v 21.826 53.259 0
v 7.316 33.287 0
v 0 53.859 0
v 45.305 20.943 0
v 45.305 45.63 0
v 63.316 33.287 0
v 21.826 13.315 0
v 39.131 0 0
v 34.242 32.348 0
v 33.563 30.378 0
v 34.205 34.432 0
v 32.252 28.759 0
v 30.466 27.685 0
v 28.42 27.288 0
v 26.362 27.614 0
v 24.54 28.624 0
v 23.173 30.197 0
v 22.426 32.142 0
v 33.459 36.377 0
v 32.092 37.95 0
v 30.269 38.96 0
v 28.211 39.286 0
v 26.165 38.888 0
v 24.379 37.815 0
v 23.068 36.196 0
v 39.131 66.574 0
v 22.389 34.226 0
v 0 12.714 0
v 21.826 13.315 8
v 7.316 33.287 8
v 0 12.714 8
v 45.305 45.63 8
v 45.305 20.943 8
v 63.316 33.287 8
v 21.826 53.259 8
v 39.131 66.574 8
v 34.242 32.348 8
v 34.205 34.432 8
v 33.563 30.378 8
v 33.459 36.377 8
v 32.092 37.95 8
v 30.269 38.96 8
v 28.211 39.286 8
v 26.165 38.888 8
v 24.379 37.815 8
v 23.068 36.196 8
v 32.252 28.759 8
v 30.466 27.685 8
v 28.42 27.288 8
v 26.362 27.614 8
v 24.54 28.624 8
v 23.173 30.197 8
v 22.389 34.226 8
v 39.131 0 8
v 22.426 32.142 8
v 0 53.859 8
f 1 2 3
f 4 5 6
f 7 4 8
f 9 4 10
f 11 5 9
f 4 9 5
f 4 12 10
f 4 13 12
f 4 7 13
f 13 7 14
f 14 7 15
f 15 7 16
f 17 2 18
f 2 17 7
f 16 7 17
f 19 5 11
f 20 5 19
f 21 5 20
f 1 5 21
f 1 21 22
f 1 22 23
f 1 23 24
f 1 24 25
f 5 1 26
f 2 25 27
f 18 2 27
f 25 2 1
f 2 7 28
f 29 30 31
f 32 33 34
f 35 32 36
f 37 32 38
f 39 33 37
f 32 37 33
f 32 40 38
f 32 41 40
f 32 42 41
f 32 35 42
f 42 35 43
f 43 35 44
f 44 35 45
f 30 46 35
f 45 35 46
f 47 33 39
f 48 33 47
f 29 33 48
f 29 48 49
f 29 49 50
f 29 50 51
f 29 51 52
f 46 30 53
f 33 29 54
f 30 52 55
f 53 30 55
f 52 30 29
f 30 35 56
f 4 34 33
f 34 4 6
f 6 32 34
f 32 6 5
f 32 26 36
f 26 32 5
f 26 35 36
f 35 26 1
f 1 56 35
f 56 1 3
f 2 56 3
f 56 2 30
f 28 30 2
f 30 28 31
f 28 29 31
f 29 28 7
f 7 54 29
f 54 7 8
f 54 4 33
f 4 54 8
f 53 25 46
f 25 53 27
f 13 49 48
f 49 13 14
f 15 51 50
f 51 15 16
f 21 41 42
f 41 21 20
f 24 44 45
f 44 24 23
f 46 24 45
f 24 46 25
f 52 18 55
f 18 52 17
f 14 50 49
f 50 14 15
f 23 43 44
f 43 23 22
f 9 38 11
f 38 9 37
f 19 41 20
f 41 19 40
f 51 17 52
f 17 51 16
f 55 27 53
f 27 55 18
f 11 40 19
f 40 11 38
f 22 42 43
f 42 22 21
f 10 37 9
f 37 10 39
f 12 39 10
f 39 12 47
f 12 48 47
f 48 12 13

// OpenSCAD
$fn = 32;

// ----------------------------------------------------------------------
// Star wheel: 5-point blunt, R35
// ----------------------------------------------------------------------

// --- parameters (mm) ---
n_points = 5;             // number of points / teeth
r_out = 35;               // tip radius
r_in = 21;                // root radius
bore_r = 6;               // centre bore radius
plate_t = 8;              // plate thickness, Z (extrusion height)
bore_d = 12;              // centre bore diameter
fit_tol = 0.1;            // declared fit tolerance (prompt contract)
free_tol = 0.5;           // declared free tolerance (prompt contract)

profile = [[63.316, 33.287], [45.305, 45.63], [39.131, 66.574], [21.826, 53.259], [0, 53.859], [7.316, 33.287], [0, 12.714], [21.826, 13.315], [39.131, 0], [45.305, 20.943]];  // primary outline, 10 points, counter clockwise
void_1 = [[34.205, 34.432], [33.459, 36.377], [32.092, 37.95], [30.269, 38.96], [28.211, 39.286], [26.165, 38.888], [24.379, 37.815], [23.068, 36.196], [22.389, 34.226], [22.426, 32.142], [23.173, 30.197], [24.54, 28.624], [26.362, 27.614], [28.42, 27.288], [30.466, 27.685], [32.252, 28.759], [33.563, 30.378], [34.242, 32.348]];  // centre bore, 18 points

// --- the one profile operation ---
difference() {
  linear_extrude(height = plate_t) polygon(points = profile);
  translate([0, 0, -1])
    linear_extrude(height = plate_t + 2) polygon(points = void_1);
}
